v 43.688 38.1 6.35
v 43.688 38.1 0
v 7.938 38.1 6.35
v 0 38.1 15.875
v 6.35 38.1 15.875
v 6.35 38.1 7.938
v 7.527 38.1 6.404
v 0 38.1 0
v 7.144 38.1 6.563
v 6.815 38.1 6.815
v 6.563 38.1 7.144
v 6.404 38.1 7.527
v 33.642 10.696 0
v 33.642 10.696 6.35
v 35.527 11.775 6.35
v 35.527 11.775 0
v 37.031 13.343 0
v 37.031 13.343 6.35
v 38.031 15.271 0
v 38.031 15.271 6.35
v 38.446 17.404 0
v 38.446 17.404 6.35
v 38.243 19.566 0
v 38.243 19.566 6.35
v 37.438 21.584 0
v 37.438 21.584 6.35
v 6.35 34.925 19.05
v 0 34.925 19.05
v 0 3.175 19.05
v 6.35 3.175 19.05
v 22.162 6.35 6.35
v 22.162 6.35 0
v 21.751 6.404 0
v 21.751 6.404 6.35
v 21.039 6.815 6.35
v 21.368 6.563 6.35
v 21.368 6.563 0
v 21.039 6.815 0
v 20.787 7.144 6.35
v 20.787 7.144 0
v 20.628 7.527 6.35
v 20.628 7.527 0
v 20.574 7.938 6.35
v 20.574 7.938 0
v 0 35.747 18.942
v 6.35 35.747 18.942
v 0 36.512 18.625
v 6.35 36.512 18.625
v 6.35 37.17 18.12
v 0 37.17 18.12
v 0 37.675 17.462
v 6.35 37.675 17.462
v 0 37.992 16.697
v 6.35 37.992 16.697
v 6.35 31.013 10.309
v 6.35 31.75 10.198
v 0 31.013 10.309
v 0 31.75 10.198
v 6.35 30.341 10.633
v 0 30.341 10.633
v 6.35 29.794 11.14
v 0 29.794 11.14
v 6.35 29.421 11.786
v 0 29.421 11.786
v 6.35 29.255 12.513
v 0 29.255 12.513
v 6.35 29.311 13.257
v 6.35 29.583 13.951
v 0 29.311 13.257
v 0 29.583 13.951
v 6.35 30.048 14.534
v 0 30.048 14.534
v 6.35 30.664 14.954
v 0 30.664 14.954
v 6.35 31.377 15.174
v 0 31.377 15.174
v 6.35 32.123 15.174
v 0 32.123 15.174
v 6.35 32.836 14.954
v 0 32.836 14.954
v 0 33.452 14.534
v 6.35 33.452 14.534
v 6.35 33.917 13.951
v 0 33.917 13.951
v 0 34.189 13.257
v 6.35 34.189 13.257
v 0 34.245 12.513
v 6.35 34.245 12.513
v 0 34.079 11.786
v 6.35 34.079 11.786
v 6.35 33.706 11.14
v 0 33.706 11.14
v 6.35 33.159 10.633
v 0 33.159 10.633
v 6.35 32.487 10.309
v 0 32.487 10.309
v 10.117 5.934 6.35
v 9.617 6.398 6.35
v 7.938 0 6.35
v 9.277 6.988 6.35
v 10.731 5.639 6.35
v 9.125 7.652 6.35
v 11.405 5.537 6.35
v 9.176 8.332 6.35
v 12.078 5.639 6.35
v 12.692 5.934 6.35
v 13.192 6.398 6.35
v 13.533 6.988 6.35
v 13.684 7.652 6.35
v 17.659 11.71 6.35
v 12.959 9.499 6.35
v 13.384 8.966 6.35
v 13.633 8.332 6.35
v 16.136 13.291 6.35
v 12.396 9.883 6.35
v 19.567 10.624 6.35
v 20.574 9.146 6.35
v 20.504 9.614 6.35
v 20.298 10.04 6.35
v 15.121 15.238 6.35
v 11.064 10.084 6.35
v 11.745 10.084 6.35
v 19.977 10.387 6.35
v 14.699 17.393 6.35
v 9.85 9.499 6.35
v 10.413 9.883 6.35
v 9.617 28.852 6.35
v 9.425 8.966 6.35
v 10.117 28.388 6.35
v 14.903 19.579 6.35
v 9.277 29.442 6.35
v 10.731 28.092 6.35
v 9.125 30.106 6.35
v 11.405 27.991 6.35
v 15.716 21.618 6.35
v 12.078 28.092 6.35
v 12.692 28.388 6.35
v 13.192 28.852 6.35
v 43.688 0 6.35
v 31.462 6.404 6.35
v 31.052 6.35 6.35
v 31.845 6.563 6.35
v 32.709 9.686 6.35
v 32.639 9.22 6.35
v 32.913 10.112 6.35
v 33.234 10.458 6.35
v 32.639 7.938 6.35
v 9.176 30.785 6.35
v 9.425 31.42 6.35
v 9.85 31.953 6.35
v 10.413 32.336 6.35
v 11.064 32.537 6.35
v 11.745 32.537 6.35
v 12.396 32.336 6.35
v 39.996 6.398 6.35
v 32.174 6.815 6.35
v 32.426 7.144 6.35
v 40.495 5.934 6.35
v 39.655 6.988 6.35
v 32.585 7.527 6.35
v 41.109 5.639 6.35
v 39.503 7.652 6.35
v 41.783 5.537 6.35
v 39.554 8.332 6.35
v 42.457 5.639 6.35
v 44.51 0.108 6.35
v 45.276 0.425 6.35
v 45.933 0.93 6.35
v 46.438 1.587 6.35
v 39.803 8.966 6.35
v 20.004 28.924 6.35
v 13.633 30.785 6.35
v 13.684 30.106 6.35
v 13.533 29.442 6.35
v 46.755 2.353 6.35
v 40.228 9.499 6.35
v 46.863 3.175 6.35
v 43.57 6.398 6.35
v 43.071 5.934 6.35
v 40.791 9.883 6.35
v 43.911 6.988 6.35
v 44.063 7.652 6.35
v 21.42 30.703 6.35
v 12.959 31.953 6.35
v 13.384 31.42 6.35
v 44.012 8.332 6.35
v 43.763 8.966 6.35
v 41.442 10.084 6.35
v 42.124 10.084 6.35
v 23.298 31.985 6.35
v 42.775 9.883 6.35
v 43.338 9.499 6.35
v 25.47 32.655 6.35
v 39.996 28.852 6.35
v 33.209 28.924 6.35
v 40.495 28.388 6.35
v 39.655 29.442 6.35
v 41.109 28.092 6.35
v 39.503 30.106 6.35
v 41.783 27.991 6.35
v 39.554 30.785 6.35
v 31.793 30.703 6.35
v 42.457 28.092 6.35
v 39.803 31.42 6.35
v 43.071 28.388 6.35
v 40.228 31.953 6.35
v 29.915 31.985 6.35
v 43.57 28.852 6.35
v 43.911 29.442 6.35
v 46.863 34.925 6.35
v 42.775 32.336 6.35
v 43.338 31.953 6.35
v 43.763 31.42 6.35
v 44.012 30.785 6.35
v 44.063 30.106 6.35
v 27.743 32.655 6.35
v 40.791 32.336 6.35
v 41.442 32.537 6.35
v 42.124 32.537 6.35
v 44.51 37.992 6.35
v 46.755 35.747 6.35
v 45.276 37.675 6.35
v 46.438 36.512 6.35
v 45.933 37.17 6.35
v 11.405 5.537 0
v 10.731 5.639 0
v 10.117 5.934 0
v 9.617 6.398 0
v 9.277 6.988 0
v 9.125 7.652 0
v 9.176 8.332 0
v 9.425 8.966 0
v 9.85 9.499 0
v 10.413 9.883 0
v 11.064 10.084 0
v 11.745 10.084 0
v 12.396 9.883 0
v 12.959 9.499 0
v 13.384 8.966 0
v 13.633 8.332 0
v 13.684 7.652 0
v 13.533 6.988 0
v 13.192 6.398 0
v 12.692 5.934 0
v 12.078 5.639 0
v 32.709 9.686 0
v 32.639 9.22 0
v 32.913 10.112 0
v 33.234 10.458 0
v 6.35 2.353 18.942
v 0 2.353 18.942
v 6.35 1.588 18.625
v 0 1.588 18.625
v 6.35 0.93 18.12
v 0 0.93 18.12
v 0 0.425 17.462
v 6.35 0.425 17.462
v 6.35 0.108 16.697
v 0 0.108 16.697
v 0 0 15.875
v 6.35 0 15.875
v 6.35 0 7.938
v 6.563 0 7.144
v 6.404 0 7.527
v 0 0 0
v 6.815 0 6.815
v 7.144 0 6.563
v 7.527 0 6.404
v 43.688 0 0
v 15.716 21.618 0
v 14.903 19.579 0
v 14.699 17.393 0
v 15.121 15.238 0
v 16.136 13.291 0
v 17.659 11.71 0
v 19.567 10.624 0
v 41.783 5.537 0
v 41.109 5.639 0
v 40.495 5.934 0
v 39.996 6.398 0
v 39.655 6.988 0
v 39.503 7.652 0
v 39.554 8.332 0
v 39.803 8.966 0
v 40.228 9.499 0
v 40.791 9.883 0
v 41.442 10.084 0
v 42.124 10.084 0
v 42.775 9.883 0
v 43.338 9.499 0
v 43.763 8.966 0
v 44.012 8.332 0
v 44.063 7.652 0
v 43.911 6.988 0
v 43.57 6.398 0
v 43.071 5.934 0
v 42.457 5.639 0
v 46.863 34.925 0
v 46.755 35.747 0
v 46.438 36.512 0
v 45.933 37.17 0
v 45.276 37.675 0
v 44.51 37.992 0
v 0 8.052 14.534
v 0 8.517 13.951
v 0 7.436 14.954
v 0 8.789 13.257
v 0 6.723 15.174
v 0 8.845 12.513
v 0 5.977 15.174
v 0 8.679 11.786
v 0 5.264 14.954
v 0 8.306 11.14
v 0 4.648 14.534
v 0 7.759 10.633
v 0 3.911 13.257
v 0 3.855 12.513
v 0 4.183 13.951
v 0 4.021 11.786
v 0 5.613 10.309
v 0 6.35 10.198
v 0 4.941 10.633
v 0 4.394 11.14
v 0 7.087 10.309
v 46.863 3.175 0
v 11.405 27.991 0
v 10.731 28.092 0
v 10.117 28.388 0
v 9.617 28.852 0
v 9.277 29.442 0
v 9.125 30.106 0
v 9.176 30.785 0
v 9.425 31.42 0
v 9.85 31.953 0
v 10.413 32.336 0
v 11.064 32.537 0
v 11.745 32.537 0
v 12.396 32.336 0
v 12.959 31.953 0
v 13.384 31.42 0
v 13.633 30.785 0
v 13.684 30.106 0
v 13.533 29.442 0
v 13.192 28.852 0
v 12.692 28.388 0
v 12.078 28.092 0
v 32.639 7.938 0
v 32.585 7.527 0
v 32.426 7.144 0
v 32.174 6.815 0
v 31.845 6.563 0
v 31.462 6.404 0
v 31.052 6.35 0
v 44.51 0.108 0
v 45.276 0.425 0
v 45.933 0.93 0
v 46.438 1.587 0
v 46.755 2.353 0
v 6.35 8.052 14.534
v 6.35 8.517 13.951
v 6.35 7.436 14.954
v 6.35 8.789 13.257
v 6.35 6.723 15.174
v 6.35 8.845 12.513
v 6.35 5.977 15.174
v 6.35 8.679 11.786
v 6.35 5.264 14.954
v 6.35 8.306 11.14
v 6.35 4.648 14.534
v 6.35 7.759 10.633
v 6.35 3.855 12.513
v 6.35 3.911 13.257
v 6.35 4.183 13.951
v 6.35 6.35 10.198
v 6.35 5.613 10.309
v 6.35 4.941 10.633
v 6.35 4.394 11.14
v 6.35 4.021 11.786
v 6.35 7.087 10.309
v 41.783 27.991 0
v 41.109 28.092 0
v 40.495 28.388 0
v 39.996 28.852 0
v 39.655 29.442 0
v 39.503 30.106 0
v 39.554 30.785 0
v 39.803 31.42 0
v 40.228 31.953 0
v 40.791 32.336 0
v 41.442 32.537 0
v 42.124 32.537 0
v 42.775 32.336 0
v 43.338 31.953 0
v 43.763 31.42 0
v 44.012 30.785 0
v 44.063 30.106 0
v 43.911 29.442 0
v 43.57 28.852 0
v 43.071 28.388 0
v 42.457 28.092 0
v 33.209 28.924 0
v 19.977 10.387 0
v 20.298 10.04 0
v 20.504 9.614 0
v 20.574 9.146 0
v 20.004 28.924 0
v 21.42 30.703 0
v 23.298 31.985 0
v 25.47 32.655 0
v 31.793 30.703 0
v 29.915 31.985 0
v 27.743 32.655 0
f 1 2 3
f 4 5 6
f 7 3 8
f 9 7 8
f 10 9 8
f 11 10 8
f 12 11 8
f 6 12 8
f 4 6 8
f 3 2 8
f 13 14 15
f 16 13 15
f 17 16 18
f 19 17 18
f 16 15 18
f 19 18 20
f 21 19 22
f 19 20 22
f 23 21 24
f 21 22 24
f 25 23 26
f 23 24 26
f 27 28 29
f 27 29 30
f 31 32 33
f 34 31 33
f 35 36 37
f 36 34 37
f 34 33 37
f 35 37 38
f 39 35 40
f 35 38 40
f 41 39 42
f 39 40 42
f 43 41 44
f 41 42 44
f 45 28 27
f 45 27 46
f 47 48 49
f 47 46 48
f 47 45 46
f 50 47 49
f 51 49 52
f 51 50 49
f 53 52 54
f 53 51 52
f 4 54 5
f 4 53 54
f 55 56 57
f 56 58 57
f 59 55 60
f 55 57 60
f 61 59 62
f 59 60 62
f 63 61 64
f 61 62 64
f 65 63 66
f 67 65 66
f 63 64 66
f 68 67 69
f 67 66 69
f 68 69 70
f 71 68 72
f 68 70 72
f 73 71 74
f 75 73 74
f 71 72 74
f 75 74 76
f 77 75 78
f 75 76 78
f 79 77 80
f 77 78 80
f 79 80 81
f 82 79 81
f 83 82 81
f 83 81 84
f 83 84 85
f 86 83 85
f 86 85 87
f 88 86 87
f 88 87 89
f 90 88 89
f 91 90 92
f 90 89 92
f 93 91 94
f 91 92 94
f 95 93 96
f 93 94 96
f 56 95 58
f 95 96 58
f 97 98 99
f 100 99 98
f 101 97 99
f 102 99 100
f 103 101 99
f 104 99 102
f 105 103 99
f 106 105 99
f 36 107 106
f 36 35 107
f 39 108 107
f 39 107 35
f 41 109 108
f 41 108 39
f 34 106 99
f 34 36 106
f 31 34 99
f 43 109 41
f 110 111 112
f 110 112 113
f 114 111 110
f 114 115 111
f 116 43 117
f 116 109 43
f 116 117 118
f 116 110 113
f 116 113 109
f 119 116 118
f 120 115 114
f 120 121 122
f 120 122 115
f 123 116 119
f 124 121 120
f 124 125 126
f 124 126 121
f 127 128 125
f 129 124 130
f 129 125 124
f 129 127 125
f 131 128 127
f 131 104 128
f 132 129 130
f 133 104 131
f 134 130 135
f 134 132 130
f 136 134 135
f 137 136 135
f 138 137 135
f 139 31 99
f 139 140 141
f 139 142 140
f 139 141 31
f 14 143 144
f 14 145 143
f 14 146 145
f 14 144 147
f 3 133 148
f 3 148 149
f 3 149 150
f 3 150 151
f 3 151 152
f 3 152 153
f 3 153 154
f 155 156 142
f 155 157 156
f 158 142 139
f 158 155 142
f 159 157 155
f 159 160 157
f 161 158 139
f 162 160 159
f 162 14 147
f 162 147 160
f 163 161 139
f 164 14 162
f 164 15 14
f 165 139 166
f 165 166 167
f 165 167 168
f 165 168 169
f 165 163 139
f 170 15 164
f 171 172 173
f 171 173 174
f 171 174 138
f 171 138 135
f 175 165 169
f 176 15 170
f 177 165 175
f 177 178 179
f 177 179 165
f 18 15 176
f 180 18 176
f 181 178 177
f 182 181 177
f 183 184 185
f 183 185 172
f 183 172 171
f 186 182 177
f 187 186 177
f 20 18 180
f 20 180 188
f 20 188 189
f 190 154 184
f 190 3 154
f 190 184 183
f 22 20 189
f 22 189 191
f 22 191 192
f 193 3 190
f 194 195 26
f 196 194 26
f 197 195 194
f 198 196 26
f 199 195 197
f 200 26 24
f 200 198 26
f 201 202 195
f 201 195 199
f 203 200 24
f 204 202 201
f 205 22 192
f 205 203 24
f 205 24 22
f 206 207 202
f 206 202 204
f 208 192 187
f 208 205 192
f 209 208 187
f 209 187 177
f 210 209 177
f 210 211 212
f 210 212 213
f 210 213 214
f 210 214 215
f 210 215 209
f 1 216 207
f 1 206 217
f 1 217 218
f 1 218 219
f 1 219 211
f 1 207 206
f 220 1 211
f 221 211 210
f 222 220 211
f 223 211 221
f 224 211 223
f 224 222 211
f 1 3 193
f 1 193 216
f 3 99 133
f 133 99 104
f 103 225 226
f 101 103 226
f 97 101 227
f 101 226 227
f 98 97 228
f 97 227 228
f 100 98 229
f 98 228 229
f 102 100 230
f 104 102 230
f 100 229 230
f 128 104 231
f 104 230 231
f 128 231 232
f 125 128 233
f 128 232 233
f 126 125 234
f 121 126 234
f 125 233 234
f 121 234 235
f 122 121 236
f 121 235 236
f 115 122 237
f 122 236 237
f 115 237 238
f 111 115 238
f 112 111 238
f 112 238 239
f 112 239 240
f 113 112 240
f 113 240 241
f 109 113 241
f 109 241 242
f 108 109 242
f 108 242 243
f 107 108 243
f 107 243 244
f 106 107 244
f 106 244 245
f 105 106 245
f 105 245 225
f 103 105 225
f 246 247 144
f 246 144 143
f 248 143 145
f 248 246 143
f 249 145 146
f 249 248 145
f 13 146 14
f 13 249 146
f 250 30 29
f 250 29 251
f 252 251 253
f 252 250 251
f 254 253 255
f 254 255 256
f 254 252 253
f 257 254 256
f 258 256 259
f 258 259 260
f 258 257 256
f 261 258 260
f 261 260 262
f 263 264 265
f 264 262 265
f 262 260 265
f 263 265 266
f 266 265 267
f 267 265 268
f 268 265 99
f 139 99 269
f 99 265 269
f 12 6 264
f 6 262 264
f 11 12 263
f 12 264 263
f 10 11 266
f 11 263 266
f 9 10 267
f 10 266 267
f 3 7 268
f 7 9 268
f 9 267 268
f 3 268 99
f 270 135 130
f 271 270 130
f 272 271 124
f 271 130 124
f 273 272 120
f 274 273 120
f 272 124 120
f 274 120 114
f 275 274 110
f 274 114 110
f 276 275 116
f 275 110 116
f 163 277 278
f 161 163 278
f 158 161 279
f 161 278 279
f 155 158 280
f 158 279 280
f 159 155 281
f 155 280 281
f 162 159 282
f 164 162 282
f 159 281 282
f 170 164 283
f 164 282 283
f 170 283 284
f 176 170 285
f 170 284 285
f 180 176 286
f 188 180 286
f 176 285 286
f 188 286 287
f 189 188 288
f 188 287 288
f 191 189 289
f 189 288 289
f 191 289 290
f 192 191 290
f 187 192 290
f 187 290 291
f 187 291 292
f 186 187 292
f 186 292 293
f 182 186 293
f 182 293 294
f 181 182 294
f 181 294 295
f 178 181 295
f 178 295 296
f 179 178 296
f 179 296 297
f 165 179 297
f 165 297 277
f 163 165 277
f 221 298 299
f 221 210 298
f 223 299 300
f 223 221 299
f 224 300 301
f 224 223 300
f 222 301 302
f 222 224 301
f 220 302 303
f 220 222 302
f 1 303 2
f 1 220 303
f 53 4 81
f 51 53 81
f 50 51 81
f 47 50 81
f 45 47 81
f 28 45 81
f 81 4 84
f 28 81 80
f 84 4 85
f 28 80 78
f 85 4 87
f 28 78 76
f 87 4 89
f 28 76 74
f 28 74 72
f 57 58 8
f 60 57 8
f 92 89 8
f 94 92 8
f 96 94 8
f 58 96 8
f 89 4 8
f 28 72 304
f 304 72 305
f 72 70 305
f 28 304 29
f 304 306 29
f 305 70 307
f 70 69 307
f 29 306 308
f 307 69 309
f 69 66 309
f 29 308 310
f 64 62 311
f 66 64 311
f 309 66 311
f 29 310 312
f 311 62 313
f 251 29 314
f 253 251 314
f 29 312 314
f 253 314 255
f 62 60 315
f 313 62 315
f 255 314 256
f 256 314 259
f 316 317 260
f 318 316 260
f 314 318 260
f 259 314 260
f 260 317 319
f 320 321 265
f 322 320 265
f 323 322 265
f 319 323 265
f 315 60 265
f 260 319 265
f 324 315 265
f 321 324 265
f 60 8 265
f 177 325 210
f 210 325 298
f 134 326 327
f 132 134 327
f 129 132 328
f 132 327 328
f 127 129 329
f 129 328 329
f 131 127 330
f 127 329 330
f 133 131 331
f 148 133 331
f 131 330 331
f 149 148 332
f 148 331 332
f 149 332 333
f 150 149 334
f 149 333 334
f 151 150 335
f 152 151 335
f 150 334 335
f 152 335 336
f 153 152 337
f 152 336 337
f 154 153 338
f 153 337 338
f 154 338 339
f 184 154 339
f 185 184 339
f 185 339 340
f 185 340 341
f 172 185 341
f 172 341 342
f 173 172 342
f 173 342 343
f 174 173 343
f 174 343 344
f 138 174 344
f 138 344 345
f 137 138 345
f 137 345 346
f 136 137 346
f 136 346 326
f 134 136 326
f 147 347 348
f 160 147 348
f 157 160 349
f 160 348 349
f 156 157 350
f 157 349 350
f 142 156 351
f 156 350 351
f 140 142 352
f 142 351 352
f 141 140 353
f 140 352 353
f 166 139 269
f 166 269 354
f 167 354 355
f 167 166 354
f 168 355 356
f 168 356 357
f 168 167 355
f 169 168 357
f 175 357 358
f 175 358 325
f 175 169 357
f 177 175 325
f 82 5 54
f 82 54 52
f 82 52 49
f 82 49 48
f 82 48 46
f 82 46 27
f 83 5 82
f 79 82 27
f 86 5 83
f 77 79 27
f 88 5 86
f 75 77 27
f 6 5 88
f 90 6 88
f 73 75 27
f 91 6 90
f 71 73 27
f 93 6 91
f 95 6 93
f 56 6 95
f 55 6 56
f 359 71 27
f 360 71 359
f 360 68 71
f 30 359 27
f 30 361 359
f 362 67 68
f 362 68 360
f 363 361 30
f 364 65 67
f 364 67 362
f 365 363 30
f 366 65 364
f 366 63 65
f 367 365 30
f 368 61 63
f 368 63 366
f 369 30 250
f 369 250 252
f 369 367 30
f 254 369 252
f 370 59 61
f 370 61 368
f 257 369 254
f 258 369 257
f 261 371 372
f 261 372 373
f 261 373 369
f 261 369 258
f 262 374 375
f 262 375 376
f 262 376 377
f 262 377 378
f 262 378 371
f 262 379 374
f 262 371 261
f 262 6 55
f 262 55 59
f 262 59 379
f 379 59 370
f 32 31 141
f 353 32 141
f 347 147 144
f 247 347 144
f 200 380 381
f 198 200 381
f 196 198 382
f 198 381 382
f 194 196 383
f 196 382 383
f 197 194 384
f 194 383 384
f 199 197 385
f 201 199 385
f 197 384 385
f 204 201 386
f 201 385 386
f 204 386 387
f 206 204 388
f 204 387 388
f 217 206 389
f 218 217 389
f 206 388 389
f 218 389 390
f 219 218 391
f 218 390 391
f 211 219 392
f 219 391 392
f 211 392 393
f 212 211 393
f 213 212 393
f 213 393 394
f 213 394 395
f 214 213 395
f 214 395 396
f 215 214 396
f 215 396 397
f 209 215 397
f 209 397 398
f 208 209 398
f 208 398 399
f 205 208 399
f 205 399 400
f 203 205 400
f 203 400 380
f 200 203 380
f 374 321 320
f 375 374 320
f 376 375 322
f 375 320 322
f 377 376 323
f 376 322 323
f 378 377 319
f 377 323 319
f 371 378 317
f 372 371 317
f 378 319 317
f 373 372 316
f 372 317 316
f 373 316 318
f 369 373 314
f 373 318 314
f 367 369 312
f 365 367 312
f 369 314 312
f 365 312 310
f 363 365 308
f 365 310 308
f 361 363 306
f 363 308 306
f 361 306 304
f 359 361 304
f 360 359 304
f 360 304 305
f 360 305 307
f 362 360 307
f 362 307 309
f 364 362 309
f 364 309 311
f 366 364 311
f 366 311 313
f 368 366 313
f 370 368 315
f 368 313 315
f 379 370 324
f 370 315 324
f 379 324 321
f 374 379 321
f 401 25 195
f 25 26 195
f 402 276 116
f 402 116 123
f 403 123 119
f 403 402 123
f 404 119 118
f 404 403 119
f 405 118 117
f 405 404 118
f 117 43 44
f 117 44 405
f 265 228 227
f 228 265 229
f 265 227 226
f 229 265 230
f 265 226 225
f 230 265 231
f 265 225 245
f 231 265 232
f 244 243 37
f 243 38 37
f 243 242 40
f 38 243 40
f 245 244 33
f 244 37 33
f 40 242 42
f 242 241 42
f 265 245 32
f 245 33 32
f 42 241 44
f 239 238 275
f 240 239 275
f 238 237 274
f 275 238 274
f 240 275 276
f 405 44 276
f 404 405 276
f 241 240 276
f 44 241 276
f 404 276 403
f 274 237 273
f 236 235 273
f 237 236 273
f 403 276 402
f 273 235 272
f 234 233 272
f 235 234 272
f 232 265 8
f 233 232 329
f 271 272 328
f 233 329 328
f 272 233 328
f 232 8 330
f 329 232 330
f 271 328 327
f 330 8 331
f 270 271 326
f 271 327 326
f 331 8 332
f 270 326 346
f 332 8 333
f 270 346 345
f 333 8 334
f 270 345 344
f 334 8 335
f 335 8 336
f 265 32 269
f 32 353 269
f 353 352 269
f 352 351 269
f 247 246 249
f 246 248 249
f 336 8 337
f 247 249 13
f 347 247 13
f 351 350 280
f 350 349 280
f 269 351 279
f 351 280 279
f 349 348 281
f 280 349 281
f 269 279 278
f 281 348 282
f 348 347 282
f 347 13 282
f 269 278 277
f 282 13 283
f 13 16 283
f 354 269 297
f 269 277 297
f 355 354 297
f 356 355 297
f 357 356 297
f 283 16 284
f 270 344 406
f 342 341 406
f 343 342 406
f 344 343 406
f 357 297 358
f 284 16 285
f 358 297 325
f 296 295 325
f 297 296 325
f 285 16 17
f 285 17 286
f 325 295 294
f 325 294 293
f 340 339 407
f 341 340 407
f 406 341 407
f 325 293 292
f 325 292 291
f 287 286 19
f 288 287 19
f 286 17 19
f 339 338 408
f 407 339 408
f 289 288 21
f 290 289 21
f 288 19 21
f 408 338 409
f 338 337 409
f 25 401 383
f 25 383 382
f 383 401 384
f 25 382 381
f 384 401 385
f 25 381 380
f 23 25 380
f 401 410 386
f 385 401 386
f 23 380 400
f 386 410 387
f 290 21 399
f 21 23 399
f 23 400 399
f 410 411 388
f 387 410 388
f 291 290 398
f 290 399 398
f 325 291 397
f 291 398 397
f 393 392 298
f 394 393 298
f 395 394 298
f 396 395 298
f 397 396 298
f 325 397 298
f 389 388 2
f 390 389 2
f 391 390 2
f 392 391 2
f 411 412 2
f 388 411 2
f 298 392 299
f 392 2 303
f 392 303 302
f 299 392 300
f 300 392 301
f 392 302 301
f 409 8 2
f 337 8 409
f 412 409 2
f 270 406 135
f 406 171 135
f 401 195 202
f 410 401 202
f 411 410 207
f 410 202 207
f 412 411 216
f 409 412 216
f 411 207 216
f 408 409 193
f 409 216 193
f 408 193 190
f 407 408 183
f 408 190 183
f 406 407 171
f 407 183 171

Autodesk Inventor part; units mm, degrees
ref_plane "YZ Plane" through (0, 0, 0) normal (1, 0, 0) x (0, 1, 0)
ref_plane "XZ Plane" through (0, 0, 0) normal (0, 1, 0) x (-1, 0, 0)
ref_plane "XY Plane" through (0, 0, 0) normal (0, 0, 1) x (1, 0, 0)
sketch "Sketch1" plane through (0, 0, 0) normal (0, 0, 1) x (1, 0, 0)
  line L0 (0, 0) -> (46.863, 0)
  line L1 (46.863, 0) -> (46.863, 38.1)
  line L2 (46.863, 38.1) -> (0, 38.1)
  line L3 (0, 38.1) -> (0, 0)
  dimension "d0" = 46.863
  dimension "d1" = 38.1
extrude "Extrusion1" add sketch "Sketch1" along normal blind 6.35
sketch "Sketch2" plane through (0, 0, 6.35) normal (0, 0, 1) x (1, 0, 0)
  line L0 (46.863, 38.1) -> (0, 38.1) projected
  line L1 (0, 0) -> (46.863, 0) projected
  line L2 (0, 38.1) -> (6.35, 38.1)
  line L3 (6.35, 38.1) -> (6.35, 0)
  line L4 (6.35, 0) -> (0, 0)
  line L5 (0, 0) -> (0, 38.1)
  dimension "d4" = 6.35
extrude "Extrusion2" add sketch "Sketch2" along normal blind 12.7
sketch "Sketch4" plane through (0, 0, 6.35) normal (0, 0, 1) x (1, 0, 0)
  line L0 (46.863, 38.1) -> (6.35, 38.1) projected
  line L1 (46.863, 0) -> (46.863, 38.1) projected
  point P0 (0, 0)
  point P1 (41.783, 30.2768)
  point P2 (40.513, 38.1)
  point P3 (6.35, 38.1)
  point P4 (43.688, 3.175)
  point P5 (43.688, 34.925)
  dimension "d8" = 7.8232
  dimension "d9" = 5.08
hole "Hole1" at (41.783, 30.2768, 6.35) direction (0, 0, -1) diameter 4.572 end through all
sketch "Sketch5" plane through (0, 0, 6.35) normal (0, 0, 1) x (1, 0, 0)
  line L0 (6.35, 0) -> (46.863, 0) projected
  line L1 (46.863, 0) -> (46.863, 38.1) projected
  point P0 (0, 0)
  point P1 (41.783, 7.8232)
  point P2 (6.35, 0)
  point P3 (40.513, 0)
  point P4 (43.688, 3.175)
  point P5 (43.688, 34.925)
  dimension "d17" = 7.8232
  dimension "d18" = 5.08
hole "Hole2" at (41.783, 7.8232, 6.35) direction (0, 0, -1) diameter 4.572 end through all
sketch "Sketch6" plane through (6.35, 0, 6.35) normal (1, 0, 0) x (0, 0, -1)
  line L0 (-12.7, 0) -> (-12.7, 38.1) projected
  line L1 (0, 38.1) -> (-12.7, 38.1) projected
  point P0 (6.35, 0)
  point P1 (-6.35, 31.75)
  dimension "d26" = 6.35
  dimension "d27" = 6.35
hole "Hole3" at (6.35, 31.75, 12.7) direction (-1, 0, 0) diameter 5.0038 end through all
sketch "Sketch7" plane through (6.35, 0, 6.35) normal (1, 0, 0) x (0, 0, -1)
  line L0 (-12.7, 0) -> (-12.7, 38.1) projected
  line L1 (0, 0) -> (-12.7, 0) projected
  point P0 (6.35, 0)
  point P1 (-6.35, 6.35)
  dimension "d35" = 6.35
  dimension "d36" = 6.35
hole "Hole4" at (6.35, 6.35, 12.7) direction (-1, 0, 0) diameter 5.0038 end through all
fillet "Fillet3" radius 3.175 4 edges at (3.175, 38.1, 19.05) (3.175, 0, 19.05) (46.863, 38.1, 3.175) (46.863, 0, 3.175)
fillet "Fillet4" radius 1.5875 1 edges at (6.35, 19.05, 6.35)
sketch "Sketch8" plane through (0, 0, 6.35) normal (0, 0, 1) x (1, 0, 0)
  line L0 (46.863, 3.175) -> (46.863, 34.925) projected
  line L1 (43.688, 38.1) -> (7.9375, 38.1) projected
  point P0 (0, 0)
  point P1 (11.4046, 30.2768)
  dimension "d47" = 35.4584
  dimension "d48" = 7.8232
hole "Hole5" at (11.4046, 30.2768, 6.35) direction (0, 0, -1) diameter 4.572 end through all
sketch "Sketch9" plane through (0, 0, 6.35) normal (0, 0, 1) x (1, 0, 0)
  line L0 (7.9375, 0) -> (43.688, 0) projected
  line L1 (46.863, 3.175) -> (46.863, 34.925) projected
  point P0 (0, 0)
  point P1 (11.4046, 7.8232)
  dimension "d56" = 7.8232
  dimension "d57" = 35.4584
hole "Hole6" at (11.4046, 7.8232, 6.35) direction (0, 0, -1) diameter 4.572 end through all
sketch "Sketch10" plane through (0, 0, 6.35) normal (0, 0, 1) x (1, 0, 0)
  line L0 (22.3774, 17.78) -> (30.8356, 17.78) construction
  line L1 (26.6065, 17.78) -> (26.6065, 25.1206) construction
  line L2 (46.863, 3.175) -> (46.863, 34.925) projected
  line L3 (7.9375, 0) -> (43.688, 0) projected
  line L4 (22.3774, 11.43) -> (30.8356, 11.43)
  line L5 (32.1087, 28.2905) -> (36.3378, 20.9499)
  arc A0 (32.8202, 23.8119) -> (26.6065, 13.0432) centre (30.8356, 17.78) ccw construction
  arc A1 (30.8356, 11.43) -> (36.3378, 20.9499) centre (30.8356, 17.78) ccw
  line L6 (21.1043, 28.2905) -> (16.8752, 20.9499)
  arc A2 (26.6065, 13.0432) -> (20.3928, 23.8119) centre (22.3774, 17.78) ccw construction
  arc A3 (16.8752, 20.9499) -> (22.3774, 11.43) centre (22.3774, 17.78) ccw
  arc A4 (32.1087, 28.2905) -> (21.1043, 28.2905) centre (26.6065, 25.1206) ccw
  arc A5 (20.3928, 23.8119) -> (32.8202, 23.8119) centre (26.6065, 25.1206) ccw construction
  line L7 (20.0039, 28.9245) -> (15.7157, 21.618)
  arc A6 (15.7157, 21.618) -> (20.574, 10.3063) centre (22.3774, 17.78) ccw
  arc A7 (32.639, 10.3765) -> (37.4382, 21.5839) centre (30.8356, 17.78) ccw
  line L8 (37.4382, 21.5839) -> (33.2091, 28.9245)
  arc A8 (33.2091, 28.9245) -> (20.0039, 28.9245) centre (26.6065, 25.1206) ccw
  line L9 (20.574, 6.35) -> (32.639, 6.35)
  line L10 (26.6065, 6.35) -> (26.6065, 4.7621) construction
  line L11 (20.574, 6.35) -> (20.574, 10.3063)
  line L12 (32.639, 6.35) -> (32.639, 10.3765)
  point P0 (0, 0)
  dimension "d65" = 8.4582
  dimension "d71" = 7.3406
  dimension "d72" = 20.2565
  dimension "d73" = 17.78
  dimension "d74" = 1.27
  dimension "d75" = 11.43
  dimension "d76" = 12.065
  dimension "d77" = 0
extrude "Extrusion3" cut sketch "Sketch10" against normal through all contours A3 L6 A4 L5 A1 L4 | A8 L8 A7 L12 L9 L11 A6 L7
fillet "Fillet5" radius 1.5875 2 edges at (20.574, 6.35, 3.175) (32.639, 6.35, 3.175)
fillet "Fillet6" radius 1.5875 2 edges at (20.574, 10.3063, 3.175) (32.639, 10.3765, 3.175)
properties part number "CAN Resistor Mount"
